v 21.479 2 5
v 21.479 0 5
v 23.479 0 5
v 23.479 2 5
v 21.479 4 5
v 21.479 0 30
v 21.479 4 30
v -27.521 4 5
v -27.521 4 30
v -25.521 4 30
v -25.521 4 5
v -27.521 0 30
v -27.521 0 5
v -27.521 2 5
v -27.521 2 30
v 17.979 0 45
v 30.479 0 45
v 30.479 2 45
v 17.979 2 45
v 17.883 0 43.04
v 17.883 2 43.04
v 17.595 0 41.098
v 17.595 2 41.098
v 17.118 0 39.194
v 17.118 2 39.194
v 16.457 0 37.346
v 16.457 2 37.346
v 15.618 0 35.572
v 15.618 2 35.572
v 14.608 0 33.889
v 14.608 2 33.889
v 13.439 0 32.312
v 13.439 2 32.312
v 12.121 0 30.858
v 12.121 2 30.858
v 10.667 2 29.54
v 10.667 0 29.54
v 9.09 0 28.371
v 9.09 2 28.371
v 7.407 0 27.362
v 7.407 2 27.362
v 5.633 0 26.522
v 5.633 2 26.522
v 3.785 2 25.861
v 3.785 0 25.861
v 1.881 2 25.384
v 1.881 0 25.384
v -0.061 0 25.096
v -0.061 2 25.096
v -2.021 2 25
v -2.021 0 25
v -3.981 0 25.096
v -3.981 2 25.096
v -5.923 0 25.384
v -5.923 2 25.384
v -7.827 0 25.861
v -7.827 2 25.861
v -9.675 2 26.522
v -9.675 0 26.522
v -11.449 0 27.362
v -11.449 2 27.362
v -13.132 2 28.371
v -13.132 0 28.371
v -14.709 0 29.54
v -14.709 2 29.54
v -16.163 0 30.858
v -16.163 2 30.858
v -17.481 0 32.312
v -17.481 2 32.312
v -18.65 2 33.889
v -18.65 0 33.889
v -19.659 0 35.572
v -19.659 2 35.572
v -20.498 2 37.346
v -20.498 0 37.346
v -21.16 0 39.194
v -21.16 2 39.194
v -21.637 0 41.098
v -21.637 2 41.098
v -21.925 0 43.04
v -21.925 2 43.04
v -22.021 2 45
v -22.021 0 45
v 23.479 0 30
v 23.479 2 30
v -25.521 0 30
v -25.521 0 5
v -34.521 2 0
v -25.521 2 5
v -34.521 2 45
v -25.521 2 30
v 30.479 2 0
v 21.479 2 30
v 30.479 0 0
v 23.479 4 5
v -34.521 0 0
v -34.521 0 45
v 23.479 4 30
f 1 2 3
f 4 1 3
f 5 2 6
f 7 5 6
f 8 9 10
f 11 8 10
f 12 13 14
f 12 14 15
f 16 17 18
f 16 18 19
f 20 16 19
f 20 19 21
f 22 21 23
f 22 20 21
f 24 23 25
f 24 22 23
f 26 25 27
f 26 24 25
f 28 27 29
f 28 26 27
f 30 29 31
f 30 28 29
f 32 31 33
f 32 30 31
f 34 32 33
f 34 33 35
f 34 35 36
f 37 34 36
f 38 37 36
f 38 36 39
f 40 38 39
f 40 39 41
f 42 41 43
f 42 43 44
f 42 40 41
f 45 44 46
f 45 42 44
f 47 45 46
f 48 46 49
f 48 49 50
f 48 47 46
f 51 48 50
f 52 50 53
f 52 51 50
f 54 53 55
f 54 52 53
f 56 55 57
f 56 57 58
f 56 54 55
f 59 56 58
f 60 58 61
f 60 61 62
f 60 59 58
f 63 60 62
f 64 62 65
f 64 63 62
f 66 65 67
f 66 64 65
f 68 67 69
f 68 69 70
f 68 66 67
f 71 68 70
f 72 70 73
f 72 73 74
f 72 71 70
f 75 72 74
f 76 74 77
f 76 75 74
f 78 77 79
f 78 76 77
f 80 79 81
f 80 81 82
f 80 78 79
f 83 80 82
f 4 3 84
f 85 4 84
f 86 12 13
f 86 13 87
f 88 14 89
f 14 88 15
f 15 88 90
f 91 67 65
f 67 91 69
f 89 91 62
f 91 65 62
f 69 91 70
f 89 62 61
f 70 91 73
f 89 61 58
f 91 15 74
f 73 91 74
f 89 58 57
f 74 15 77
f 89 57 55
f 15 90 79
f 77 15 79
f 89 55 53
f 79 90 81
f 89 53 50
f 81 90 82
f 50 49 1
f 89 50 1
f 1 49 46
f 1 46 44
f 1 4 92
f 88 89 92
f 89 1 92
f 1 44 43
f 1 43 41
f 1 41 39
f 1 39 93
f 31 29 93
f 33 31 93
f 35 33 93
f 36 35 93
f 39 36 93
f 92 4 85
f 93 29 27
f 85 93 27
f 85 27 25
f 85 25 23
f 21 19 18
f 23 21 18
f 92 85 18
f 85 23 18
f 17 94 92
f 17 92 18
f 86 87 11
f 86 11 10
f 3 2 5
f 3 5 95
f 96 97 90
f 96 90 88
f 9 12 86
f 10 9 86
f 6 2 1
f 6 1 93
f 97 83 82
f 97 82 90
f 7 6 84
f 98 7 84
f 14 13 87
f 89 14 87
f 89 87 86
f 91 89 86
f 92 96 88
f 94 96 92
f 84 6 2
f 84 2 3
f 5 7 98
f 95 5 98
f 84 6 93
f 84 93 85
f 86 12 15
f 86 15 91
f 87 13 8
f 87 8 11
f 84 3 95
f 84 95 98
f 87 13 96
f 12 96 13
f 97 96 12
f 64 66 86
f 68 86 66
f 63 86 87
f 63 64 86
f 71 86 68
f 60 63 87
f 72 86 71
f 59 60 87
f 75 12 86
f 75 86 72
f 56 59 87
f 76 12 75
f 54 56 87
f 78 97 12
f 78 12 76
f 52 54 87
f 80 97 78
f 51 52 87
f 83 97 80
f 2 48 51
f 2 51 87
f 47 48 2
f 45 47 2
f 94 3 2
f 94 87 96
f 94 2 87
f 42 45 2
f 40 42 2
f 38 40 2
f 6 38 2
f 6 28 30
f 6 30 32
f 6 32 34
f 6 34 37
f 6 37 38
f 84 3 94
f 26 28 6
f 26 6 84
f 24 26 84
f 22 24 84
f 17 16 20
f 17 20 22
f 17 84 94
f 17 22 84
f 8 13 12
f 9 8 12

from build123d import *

# Parameters (mm, degrees)
F0_W     = 2
F0_H     = 25
F1_DEPTH = 4
F2_DEPTH = 2


with BuildPart() as f1:
    # F0 (on Front) → F1 (new body)
    with BuildSketch(Plane.XZ):
        with Locations((-26.520908, 17.5)):
            Rectangle(F0_W, F0_H)
        with Locations((22.479092, 17.5)):
            Rectangle(F0_W, F0_H)
    extrude(amount=-F1_DEPTH)


with BuildPart() as f2:
    # F0 (on Front) → F2 (new body)
    with BuildSketch(Plane.XZ):
        with BuildLine():
            Line((-34.520908, 45), (-34.520908, 0))
            Line((-34.520908, 0), (30.479092, 0))
            Line((30.479092, 0), (30.479092, 45))
            Line((30.479092, 45), (17.979092, 45))
            ThreePointArc((17.979092, 45), (-2.020908, 25), (-22.020908, 45))
            Line((-22.020908, 45), (-34.520908, 45))
        make_face()
        with Locations((-26.520908, 17.5)):
            Rectangle(F0_W, F0_H, mode=Mode.SUBTRACT)
        with Locations((22.479092, 17.5)):
            Rectangle(F0_W, F0_H, mode=Mode.SUBTRACT)
    extrude(amount=-F2_DEPTH)


solid = Compound([f1.part, f2.part])
